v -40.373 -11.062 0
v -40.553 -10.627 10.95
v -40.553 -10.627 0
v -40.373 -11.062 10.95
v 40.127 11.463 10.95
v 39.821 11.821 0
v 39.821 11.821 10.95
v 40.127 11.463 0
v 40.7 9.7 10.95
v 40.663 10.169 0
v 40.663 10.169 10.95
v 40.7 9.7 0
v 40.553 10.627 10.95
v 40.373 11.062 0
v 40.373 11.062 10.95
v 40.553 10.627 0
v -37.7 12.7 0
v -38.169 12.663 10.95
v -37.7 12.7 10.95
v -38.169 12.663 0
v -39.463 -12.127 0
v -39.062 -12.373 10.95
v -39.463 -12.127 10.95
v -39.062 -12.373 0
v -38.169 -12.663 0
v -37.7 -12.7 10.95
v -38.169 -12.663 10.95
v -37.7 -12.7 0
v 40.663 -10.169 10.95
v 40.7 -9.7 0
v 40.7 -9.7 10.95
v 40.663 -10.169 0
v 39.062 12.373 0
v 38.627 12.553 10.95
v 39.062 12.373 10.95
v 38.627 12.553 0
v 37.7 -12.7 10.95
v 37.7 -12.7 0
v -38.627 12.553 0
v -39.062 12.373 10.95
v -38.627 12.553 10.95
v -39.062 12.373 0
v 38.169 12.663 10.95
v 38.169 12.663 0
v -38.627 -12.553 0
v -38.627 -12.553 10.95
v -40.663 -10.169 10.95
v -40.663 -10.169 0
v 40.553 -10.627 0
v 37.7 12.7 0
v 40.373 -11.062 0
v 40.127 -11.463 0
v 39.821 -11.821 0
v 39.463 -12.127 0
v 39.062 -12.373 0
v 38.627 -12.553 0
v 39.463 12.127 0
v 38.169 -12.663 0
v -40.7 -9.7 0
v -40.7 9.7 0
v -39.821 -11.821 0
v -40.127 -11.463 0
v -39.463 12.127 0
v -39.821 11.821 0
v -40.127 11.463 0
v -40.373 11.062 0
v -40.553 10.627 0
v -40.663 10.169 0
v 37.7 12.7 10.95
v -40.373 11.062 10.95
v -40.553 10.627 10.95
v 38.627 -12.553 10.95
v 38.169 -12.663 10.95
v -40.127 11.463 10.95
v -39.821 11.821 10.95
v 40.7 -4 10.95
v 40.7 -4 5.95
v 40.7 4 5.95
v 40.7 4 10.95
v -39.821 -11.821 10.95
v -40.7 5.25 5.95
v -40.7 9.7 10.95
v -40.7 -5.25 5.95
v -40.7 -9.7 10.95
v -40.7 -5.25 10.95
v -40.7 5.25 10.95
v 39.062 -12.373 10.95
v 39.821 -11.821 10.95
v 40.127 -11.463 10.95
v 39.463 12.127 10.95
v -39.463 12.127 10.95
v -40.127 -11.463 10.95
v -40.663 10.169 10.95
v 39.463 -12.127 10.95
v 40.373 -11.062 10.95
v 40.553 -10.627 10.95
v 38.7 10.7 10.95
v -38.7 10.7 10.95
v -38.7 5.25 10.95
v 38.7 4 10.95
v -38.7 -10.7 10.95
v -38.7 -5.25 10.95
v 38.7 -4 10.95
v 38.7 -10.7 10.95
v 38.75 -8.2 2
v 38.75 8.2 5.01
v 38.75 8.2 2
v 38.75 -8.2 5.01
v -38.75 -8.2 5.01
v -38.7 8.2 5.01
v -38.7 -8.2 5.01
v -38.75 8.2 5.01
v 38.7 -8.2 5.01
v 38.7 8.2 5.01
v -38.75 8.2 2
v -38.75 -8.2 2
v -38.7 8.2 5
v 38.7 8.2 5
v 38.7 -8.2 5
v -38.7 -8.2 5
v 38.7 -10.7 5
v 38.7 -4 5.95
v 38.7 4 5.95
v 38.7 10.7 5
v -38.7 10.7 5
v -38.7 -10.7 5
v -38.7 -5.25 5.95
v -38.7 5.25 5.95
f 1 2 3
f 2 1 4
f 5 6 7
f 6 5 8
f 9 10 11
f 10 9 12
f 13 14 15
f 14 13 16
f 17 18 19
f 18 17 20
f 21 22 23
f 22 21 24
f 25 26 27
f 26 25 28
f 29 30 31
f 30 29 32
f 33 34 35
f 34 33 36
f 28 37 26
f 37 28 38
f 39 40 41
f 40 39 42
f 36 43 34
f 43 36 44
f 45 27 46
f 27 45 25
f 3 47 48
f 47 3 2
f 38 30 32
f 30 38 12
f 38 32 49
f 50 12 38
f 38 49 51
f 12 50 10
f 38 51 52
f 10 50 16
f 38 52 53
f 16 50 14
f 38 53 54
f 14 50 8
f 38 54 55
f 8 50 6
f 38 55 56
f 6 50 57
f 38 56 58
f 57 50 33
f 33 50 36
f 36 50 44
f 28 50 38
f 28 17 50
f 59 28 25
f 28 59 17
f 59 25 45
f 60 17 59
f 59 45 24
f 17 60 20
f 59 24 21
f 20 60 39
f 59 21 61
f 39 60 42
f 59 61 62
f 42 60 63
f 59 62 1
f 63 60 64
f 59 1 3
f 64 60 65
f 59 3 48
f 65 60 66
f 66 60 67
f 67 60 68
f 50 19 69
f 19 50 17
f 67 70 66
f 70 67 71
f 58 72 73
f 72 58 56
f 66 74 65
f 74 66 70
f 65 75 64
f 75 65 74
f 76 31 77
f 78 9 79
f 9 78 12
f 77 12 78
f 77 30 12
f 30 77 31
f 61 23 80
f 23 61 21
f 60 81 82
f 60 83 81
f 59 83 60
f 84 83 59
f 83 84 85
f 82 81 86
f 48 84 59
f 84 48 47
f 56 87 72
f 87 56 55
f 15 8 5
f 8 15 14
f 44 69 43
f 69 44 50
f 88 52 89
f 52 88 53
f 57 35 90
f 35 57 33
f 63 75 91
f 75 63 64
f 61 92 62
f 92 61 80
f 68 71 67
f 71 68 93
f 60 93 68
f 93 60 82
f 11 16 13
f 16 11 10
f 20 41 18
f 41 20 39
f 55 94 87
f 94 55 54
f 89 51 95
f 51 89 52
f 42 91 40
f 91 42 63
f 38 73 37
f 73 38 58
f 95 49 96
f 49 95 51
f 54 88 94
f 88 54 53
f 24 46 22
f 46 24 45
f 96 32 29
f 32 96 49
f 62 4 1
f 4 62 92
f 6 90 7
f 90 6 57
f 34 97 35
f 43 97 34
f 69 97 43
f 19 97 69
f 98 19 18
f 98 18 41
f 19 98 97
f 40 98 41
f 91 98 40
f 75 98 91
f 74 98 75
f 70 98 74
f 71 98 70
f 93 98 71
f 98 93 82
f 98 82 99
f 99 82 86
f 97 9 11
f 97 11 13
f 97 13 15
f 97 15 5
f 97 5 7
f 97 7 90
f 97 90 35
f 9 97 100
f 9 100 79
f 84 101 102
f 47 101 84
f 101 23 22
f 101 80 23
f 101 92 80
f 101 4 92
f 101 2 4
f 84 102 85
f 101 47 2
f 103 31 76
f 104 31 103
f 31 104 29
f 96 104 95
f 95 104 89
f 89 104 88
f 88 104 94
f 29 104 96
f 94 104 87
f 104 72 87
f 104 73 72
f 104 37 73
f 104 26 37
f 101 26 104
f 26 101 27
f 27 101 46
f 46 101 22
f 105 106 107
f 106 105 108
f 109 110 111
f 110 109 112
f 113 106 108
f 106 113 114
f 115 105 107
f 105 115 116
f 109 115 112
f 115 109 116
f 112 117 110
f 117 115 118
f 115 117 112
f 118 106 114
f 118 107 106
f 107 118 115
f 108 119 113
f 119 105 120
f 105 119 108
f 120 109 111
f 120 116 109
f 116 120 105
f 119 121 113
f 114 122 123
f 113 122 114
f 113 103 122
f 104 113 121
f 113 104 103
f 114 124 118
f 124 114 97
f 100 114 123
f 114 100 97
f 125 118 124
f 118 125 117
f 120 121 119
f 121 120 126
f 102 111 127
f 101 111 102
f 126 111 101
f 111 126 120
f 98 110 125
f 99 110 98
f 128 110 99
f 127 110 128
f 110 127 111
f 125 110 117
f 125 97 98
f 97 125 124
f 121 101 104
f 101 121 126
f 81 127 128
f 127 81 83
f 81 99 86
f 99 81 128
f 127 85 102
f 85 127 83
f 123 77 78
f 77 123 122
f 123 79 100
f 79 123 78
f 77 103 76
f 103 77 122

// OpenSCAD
// =====================================================================
// Pimoroni Pico Plus 2 W XL - Open Carrier Case (Fixed Floor)
// PCB Footprint: 77.0 x 21.0 x 1.45 mm
// =====================================================================

$fn = 40;

// --- Board & Fit Parameters ---
pcb_len        = 77.0;   // PCB length (X)
pcb_wid        = 21.0;   // PCB width (Y)
pcb_thick      = 1.45;   // PCB thickness (Z)
pcb_clearance  = 0.40;   // Total XY clearance (0.2 mm per side for slip fit)

// --- Enclosure Parameters ---
wall_thick     = 2.0;    // Case wall thickness
floor_thick    = 2.0;    // Solid floor thickness at bottom
outer_radius   = 3.0;    // Outer corner fillet radius

floor_lift     = 3.0;    // Gap between inside floor and shelf top
ledge_width    = 2.5;    // Long-edge shelf width (both Y sides)
board_headroom = 4.5;    // Wall height above the PCB top surface

// --- Port Cutout Parameters ---
usbc_cut_w     = 10.5;   // USB-C width (Y)
usbc_cut_h     = 5.5;    // USB-C height (Z)
usbc_sub_drop  = 0.5;    // Extra depth below top surface of PCB

jst_cut_w      = 8.0;    // JST-PH width (Y)
jst_cut_h      = 6.5;    // JST-PH height (Z)
jst_sub_drop   = 0.5;    // Extra depth below top surface of PCB

// --- Derived Dimensions ---
cavity_x   = pcb_len + pcb_clearance;
cavity_y   = pcb_wid + pcb_clearance;
case_h     = floor_thick + floor_lift + pcb_thick + board_headroom;

outer_x    = cavity_x + (2 * wall_thick);
outer_y    = cavity_y + (2 * wall_thick);

pcb_z_base = floor_thick + floor_lift; // Shelf top surface (Z = 5.0 mm)

// --- Helper: 2D Rounded Rectangle ---
module rounded_rect(w, l, r) {
    hull() {
        for (dx = [-w/2 + r, w/2 - r]) {
            for (dy = [-l/2 + r, l/2 - r]) {
                translate([dx, dy]) circle(r = r);
            }
        }
    }
}

// --- Main Enclosure Model ---
module pico_plus_2w_xl_case() {
    difference() {
        // 1. Solid rounded outer body (Z: 0 -> case_h)
        linear_extrude(height = case_h) {
            rounded_rect(outer_x, outer_y, outer_radius);
        }

        // 2. Central lower drop between the ledges (Z: floor_thick -> pcb_z_base)
        // Preserves the 2.0 mm solid floor below and leaves 2.5 mm ledges on the sides
        translate([-(cavity_x + 0.1)/2, -(cavity_y - 2 * ledge_width)/2, floor_thick]) {
            cube([cavity_x + 0.1, cavity_y - 2 * ledge_width, floor_lift + 0.01]);
        }

        // 3. Upper PCB well and component chamber (Z: pcb_z_base -> top)
        translate([-cavity_x/2, -cavity_y/2, pcb_z_base]) {
            cube([cavity_x, cavity_y, case_h - pcb_z_base + 1.0]);
        }

        // 4. Centred USB-C Cutout (at -X end)
        translate([
            -(cavity_x / 2 + wall_thick * 1.5), 
            -usbc_cut_w / 2, 
            pcb_z_base + pcb_thick - usbc_sub_drop
        ]) {
            cube([wall_thick * 2, usbc_cut_w, usbc_cut_h]);
        }

        // 5. Centred JST-PH Cutout (at +X end)
        translate([
            cavity_x / 2 - 0.1, 
            -jst_cut_w / 2, 
            pcb_z_base + pcb_thick - jst_sub_drop
        ]) {
            cube([wall_thick * 2, jst_cut_w, jst_cut_h]);
        }
    }
}

pico_plus_2w_xl_case();
